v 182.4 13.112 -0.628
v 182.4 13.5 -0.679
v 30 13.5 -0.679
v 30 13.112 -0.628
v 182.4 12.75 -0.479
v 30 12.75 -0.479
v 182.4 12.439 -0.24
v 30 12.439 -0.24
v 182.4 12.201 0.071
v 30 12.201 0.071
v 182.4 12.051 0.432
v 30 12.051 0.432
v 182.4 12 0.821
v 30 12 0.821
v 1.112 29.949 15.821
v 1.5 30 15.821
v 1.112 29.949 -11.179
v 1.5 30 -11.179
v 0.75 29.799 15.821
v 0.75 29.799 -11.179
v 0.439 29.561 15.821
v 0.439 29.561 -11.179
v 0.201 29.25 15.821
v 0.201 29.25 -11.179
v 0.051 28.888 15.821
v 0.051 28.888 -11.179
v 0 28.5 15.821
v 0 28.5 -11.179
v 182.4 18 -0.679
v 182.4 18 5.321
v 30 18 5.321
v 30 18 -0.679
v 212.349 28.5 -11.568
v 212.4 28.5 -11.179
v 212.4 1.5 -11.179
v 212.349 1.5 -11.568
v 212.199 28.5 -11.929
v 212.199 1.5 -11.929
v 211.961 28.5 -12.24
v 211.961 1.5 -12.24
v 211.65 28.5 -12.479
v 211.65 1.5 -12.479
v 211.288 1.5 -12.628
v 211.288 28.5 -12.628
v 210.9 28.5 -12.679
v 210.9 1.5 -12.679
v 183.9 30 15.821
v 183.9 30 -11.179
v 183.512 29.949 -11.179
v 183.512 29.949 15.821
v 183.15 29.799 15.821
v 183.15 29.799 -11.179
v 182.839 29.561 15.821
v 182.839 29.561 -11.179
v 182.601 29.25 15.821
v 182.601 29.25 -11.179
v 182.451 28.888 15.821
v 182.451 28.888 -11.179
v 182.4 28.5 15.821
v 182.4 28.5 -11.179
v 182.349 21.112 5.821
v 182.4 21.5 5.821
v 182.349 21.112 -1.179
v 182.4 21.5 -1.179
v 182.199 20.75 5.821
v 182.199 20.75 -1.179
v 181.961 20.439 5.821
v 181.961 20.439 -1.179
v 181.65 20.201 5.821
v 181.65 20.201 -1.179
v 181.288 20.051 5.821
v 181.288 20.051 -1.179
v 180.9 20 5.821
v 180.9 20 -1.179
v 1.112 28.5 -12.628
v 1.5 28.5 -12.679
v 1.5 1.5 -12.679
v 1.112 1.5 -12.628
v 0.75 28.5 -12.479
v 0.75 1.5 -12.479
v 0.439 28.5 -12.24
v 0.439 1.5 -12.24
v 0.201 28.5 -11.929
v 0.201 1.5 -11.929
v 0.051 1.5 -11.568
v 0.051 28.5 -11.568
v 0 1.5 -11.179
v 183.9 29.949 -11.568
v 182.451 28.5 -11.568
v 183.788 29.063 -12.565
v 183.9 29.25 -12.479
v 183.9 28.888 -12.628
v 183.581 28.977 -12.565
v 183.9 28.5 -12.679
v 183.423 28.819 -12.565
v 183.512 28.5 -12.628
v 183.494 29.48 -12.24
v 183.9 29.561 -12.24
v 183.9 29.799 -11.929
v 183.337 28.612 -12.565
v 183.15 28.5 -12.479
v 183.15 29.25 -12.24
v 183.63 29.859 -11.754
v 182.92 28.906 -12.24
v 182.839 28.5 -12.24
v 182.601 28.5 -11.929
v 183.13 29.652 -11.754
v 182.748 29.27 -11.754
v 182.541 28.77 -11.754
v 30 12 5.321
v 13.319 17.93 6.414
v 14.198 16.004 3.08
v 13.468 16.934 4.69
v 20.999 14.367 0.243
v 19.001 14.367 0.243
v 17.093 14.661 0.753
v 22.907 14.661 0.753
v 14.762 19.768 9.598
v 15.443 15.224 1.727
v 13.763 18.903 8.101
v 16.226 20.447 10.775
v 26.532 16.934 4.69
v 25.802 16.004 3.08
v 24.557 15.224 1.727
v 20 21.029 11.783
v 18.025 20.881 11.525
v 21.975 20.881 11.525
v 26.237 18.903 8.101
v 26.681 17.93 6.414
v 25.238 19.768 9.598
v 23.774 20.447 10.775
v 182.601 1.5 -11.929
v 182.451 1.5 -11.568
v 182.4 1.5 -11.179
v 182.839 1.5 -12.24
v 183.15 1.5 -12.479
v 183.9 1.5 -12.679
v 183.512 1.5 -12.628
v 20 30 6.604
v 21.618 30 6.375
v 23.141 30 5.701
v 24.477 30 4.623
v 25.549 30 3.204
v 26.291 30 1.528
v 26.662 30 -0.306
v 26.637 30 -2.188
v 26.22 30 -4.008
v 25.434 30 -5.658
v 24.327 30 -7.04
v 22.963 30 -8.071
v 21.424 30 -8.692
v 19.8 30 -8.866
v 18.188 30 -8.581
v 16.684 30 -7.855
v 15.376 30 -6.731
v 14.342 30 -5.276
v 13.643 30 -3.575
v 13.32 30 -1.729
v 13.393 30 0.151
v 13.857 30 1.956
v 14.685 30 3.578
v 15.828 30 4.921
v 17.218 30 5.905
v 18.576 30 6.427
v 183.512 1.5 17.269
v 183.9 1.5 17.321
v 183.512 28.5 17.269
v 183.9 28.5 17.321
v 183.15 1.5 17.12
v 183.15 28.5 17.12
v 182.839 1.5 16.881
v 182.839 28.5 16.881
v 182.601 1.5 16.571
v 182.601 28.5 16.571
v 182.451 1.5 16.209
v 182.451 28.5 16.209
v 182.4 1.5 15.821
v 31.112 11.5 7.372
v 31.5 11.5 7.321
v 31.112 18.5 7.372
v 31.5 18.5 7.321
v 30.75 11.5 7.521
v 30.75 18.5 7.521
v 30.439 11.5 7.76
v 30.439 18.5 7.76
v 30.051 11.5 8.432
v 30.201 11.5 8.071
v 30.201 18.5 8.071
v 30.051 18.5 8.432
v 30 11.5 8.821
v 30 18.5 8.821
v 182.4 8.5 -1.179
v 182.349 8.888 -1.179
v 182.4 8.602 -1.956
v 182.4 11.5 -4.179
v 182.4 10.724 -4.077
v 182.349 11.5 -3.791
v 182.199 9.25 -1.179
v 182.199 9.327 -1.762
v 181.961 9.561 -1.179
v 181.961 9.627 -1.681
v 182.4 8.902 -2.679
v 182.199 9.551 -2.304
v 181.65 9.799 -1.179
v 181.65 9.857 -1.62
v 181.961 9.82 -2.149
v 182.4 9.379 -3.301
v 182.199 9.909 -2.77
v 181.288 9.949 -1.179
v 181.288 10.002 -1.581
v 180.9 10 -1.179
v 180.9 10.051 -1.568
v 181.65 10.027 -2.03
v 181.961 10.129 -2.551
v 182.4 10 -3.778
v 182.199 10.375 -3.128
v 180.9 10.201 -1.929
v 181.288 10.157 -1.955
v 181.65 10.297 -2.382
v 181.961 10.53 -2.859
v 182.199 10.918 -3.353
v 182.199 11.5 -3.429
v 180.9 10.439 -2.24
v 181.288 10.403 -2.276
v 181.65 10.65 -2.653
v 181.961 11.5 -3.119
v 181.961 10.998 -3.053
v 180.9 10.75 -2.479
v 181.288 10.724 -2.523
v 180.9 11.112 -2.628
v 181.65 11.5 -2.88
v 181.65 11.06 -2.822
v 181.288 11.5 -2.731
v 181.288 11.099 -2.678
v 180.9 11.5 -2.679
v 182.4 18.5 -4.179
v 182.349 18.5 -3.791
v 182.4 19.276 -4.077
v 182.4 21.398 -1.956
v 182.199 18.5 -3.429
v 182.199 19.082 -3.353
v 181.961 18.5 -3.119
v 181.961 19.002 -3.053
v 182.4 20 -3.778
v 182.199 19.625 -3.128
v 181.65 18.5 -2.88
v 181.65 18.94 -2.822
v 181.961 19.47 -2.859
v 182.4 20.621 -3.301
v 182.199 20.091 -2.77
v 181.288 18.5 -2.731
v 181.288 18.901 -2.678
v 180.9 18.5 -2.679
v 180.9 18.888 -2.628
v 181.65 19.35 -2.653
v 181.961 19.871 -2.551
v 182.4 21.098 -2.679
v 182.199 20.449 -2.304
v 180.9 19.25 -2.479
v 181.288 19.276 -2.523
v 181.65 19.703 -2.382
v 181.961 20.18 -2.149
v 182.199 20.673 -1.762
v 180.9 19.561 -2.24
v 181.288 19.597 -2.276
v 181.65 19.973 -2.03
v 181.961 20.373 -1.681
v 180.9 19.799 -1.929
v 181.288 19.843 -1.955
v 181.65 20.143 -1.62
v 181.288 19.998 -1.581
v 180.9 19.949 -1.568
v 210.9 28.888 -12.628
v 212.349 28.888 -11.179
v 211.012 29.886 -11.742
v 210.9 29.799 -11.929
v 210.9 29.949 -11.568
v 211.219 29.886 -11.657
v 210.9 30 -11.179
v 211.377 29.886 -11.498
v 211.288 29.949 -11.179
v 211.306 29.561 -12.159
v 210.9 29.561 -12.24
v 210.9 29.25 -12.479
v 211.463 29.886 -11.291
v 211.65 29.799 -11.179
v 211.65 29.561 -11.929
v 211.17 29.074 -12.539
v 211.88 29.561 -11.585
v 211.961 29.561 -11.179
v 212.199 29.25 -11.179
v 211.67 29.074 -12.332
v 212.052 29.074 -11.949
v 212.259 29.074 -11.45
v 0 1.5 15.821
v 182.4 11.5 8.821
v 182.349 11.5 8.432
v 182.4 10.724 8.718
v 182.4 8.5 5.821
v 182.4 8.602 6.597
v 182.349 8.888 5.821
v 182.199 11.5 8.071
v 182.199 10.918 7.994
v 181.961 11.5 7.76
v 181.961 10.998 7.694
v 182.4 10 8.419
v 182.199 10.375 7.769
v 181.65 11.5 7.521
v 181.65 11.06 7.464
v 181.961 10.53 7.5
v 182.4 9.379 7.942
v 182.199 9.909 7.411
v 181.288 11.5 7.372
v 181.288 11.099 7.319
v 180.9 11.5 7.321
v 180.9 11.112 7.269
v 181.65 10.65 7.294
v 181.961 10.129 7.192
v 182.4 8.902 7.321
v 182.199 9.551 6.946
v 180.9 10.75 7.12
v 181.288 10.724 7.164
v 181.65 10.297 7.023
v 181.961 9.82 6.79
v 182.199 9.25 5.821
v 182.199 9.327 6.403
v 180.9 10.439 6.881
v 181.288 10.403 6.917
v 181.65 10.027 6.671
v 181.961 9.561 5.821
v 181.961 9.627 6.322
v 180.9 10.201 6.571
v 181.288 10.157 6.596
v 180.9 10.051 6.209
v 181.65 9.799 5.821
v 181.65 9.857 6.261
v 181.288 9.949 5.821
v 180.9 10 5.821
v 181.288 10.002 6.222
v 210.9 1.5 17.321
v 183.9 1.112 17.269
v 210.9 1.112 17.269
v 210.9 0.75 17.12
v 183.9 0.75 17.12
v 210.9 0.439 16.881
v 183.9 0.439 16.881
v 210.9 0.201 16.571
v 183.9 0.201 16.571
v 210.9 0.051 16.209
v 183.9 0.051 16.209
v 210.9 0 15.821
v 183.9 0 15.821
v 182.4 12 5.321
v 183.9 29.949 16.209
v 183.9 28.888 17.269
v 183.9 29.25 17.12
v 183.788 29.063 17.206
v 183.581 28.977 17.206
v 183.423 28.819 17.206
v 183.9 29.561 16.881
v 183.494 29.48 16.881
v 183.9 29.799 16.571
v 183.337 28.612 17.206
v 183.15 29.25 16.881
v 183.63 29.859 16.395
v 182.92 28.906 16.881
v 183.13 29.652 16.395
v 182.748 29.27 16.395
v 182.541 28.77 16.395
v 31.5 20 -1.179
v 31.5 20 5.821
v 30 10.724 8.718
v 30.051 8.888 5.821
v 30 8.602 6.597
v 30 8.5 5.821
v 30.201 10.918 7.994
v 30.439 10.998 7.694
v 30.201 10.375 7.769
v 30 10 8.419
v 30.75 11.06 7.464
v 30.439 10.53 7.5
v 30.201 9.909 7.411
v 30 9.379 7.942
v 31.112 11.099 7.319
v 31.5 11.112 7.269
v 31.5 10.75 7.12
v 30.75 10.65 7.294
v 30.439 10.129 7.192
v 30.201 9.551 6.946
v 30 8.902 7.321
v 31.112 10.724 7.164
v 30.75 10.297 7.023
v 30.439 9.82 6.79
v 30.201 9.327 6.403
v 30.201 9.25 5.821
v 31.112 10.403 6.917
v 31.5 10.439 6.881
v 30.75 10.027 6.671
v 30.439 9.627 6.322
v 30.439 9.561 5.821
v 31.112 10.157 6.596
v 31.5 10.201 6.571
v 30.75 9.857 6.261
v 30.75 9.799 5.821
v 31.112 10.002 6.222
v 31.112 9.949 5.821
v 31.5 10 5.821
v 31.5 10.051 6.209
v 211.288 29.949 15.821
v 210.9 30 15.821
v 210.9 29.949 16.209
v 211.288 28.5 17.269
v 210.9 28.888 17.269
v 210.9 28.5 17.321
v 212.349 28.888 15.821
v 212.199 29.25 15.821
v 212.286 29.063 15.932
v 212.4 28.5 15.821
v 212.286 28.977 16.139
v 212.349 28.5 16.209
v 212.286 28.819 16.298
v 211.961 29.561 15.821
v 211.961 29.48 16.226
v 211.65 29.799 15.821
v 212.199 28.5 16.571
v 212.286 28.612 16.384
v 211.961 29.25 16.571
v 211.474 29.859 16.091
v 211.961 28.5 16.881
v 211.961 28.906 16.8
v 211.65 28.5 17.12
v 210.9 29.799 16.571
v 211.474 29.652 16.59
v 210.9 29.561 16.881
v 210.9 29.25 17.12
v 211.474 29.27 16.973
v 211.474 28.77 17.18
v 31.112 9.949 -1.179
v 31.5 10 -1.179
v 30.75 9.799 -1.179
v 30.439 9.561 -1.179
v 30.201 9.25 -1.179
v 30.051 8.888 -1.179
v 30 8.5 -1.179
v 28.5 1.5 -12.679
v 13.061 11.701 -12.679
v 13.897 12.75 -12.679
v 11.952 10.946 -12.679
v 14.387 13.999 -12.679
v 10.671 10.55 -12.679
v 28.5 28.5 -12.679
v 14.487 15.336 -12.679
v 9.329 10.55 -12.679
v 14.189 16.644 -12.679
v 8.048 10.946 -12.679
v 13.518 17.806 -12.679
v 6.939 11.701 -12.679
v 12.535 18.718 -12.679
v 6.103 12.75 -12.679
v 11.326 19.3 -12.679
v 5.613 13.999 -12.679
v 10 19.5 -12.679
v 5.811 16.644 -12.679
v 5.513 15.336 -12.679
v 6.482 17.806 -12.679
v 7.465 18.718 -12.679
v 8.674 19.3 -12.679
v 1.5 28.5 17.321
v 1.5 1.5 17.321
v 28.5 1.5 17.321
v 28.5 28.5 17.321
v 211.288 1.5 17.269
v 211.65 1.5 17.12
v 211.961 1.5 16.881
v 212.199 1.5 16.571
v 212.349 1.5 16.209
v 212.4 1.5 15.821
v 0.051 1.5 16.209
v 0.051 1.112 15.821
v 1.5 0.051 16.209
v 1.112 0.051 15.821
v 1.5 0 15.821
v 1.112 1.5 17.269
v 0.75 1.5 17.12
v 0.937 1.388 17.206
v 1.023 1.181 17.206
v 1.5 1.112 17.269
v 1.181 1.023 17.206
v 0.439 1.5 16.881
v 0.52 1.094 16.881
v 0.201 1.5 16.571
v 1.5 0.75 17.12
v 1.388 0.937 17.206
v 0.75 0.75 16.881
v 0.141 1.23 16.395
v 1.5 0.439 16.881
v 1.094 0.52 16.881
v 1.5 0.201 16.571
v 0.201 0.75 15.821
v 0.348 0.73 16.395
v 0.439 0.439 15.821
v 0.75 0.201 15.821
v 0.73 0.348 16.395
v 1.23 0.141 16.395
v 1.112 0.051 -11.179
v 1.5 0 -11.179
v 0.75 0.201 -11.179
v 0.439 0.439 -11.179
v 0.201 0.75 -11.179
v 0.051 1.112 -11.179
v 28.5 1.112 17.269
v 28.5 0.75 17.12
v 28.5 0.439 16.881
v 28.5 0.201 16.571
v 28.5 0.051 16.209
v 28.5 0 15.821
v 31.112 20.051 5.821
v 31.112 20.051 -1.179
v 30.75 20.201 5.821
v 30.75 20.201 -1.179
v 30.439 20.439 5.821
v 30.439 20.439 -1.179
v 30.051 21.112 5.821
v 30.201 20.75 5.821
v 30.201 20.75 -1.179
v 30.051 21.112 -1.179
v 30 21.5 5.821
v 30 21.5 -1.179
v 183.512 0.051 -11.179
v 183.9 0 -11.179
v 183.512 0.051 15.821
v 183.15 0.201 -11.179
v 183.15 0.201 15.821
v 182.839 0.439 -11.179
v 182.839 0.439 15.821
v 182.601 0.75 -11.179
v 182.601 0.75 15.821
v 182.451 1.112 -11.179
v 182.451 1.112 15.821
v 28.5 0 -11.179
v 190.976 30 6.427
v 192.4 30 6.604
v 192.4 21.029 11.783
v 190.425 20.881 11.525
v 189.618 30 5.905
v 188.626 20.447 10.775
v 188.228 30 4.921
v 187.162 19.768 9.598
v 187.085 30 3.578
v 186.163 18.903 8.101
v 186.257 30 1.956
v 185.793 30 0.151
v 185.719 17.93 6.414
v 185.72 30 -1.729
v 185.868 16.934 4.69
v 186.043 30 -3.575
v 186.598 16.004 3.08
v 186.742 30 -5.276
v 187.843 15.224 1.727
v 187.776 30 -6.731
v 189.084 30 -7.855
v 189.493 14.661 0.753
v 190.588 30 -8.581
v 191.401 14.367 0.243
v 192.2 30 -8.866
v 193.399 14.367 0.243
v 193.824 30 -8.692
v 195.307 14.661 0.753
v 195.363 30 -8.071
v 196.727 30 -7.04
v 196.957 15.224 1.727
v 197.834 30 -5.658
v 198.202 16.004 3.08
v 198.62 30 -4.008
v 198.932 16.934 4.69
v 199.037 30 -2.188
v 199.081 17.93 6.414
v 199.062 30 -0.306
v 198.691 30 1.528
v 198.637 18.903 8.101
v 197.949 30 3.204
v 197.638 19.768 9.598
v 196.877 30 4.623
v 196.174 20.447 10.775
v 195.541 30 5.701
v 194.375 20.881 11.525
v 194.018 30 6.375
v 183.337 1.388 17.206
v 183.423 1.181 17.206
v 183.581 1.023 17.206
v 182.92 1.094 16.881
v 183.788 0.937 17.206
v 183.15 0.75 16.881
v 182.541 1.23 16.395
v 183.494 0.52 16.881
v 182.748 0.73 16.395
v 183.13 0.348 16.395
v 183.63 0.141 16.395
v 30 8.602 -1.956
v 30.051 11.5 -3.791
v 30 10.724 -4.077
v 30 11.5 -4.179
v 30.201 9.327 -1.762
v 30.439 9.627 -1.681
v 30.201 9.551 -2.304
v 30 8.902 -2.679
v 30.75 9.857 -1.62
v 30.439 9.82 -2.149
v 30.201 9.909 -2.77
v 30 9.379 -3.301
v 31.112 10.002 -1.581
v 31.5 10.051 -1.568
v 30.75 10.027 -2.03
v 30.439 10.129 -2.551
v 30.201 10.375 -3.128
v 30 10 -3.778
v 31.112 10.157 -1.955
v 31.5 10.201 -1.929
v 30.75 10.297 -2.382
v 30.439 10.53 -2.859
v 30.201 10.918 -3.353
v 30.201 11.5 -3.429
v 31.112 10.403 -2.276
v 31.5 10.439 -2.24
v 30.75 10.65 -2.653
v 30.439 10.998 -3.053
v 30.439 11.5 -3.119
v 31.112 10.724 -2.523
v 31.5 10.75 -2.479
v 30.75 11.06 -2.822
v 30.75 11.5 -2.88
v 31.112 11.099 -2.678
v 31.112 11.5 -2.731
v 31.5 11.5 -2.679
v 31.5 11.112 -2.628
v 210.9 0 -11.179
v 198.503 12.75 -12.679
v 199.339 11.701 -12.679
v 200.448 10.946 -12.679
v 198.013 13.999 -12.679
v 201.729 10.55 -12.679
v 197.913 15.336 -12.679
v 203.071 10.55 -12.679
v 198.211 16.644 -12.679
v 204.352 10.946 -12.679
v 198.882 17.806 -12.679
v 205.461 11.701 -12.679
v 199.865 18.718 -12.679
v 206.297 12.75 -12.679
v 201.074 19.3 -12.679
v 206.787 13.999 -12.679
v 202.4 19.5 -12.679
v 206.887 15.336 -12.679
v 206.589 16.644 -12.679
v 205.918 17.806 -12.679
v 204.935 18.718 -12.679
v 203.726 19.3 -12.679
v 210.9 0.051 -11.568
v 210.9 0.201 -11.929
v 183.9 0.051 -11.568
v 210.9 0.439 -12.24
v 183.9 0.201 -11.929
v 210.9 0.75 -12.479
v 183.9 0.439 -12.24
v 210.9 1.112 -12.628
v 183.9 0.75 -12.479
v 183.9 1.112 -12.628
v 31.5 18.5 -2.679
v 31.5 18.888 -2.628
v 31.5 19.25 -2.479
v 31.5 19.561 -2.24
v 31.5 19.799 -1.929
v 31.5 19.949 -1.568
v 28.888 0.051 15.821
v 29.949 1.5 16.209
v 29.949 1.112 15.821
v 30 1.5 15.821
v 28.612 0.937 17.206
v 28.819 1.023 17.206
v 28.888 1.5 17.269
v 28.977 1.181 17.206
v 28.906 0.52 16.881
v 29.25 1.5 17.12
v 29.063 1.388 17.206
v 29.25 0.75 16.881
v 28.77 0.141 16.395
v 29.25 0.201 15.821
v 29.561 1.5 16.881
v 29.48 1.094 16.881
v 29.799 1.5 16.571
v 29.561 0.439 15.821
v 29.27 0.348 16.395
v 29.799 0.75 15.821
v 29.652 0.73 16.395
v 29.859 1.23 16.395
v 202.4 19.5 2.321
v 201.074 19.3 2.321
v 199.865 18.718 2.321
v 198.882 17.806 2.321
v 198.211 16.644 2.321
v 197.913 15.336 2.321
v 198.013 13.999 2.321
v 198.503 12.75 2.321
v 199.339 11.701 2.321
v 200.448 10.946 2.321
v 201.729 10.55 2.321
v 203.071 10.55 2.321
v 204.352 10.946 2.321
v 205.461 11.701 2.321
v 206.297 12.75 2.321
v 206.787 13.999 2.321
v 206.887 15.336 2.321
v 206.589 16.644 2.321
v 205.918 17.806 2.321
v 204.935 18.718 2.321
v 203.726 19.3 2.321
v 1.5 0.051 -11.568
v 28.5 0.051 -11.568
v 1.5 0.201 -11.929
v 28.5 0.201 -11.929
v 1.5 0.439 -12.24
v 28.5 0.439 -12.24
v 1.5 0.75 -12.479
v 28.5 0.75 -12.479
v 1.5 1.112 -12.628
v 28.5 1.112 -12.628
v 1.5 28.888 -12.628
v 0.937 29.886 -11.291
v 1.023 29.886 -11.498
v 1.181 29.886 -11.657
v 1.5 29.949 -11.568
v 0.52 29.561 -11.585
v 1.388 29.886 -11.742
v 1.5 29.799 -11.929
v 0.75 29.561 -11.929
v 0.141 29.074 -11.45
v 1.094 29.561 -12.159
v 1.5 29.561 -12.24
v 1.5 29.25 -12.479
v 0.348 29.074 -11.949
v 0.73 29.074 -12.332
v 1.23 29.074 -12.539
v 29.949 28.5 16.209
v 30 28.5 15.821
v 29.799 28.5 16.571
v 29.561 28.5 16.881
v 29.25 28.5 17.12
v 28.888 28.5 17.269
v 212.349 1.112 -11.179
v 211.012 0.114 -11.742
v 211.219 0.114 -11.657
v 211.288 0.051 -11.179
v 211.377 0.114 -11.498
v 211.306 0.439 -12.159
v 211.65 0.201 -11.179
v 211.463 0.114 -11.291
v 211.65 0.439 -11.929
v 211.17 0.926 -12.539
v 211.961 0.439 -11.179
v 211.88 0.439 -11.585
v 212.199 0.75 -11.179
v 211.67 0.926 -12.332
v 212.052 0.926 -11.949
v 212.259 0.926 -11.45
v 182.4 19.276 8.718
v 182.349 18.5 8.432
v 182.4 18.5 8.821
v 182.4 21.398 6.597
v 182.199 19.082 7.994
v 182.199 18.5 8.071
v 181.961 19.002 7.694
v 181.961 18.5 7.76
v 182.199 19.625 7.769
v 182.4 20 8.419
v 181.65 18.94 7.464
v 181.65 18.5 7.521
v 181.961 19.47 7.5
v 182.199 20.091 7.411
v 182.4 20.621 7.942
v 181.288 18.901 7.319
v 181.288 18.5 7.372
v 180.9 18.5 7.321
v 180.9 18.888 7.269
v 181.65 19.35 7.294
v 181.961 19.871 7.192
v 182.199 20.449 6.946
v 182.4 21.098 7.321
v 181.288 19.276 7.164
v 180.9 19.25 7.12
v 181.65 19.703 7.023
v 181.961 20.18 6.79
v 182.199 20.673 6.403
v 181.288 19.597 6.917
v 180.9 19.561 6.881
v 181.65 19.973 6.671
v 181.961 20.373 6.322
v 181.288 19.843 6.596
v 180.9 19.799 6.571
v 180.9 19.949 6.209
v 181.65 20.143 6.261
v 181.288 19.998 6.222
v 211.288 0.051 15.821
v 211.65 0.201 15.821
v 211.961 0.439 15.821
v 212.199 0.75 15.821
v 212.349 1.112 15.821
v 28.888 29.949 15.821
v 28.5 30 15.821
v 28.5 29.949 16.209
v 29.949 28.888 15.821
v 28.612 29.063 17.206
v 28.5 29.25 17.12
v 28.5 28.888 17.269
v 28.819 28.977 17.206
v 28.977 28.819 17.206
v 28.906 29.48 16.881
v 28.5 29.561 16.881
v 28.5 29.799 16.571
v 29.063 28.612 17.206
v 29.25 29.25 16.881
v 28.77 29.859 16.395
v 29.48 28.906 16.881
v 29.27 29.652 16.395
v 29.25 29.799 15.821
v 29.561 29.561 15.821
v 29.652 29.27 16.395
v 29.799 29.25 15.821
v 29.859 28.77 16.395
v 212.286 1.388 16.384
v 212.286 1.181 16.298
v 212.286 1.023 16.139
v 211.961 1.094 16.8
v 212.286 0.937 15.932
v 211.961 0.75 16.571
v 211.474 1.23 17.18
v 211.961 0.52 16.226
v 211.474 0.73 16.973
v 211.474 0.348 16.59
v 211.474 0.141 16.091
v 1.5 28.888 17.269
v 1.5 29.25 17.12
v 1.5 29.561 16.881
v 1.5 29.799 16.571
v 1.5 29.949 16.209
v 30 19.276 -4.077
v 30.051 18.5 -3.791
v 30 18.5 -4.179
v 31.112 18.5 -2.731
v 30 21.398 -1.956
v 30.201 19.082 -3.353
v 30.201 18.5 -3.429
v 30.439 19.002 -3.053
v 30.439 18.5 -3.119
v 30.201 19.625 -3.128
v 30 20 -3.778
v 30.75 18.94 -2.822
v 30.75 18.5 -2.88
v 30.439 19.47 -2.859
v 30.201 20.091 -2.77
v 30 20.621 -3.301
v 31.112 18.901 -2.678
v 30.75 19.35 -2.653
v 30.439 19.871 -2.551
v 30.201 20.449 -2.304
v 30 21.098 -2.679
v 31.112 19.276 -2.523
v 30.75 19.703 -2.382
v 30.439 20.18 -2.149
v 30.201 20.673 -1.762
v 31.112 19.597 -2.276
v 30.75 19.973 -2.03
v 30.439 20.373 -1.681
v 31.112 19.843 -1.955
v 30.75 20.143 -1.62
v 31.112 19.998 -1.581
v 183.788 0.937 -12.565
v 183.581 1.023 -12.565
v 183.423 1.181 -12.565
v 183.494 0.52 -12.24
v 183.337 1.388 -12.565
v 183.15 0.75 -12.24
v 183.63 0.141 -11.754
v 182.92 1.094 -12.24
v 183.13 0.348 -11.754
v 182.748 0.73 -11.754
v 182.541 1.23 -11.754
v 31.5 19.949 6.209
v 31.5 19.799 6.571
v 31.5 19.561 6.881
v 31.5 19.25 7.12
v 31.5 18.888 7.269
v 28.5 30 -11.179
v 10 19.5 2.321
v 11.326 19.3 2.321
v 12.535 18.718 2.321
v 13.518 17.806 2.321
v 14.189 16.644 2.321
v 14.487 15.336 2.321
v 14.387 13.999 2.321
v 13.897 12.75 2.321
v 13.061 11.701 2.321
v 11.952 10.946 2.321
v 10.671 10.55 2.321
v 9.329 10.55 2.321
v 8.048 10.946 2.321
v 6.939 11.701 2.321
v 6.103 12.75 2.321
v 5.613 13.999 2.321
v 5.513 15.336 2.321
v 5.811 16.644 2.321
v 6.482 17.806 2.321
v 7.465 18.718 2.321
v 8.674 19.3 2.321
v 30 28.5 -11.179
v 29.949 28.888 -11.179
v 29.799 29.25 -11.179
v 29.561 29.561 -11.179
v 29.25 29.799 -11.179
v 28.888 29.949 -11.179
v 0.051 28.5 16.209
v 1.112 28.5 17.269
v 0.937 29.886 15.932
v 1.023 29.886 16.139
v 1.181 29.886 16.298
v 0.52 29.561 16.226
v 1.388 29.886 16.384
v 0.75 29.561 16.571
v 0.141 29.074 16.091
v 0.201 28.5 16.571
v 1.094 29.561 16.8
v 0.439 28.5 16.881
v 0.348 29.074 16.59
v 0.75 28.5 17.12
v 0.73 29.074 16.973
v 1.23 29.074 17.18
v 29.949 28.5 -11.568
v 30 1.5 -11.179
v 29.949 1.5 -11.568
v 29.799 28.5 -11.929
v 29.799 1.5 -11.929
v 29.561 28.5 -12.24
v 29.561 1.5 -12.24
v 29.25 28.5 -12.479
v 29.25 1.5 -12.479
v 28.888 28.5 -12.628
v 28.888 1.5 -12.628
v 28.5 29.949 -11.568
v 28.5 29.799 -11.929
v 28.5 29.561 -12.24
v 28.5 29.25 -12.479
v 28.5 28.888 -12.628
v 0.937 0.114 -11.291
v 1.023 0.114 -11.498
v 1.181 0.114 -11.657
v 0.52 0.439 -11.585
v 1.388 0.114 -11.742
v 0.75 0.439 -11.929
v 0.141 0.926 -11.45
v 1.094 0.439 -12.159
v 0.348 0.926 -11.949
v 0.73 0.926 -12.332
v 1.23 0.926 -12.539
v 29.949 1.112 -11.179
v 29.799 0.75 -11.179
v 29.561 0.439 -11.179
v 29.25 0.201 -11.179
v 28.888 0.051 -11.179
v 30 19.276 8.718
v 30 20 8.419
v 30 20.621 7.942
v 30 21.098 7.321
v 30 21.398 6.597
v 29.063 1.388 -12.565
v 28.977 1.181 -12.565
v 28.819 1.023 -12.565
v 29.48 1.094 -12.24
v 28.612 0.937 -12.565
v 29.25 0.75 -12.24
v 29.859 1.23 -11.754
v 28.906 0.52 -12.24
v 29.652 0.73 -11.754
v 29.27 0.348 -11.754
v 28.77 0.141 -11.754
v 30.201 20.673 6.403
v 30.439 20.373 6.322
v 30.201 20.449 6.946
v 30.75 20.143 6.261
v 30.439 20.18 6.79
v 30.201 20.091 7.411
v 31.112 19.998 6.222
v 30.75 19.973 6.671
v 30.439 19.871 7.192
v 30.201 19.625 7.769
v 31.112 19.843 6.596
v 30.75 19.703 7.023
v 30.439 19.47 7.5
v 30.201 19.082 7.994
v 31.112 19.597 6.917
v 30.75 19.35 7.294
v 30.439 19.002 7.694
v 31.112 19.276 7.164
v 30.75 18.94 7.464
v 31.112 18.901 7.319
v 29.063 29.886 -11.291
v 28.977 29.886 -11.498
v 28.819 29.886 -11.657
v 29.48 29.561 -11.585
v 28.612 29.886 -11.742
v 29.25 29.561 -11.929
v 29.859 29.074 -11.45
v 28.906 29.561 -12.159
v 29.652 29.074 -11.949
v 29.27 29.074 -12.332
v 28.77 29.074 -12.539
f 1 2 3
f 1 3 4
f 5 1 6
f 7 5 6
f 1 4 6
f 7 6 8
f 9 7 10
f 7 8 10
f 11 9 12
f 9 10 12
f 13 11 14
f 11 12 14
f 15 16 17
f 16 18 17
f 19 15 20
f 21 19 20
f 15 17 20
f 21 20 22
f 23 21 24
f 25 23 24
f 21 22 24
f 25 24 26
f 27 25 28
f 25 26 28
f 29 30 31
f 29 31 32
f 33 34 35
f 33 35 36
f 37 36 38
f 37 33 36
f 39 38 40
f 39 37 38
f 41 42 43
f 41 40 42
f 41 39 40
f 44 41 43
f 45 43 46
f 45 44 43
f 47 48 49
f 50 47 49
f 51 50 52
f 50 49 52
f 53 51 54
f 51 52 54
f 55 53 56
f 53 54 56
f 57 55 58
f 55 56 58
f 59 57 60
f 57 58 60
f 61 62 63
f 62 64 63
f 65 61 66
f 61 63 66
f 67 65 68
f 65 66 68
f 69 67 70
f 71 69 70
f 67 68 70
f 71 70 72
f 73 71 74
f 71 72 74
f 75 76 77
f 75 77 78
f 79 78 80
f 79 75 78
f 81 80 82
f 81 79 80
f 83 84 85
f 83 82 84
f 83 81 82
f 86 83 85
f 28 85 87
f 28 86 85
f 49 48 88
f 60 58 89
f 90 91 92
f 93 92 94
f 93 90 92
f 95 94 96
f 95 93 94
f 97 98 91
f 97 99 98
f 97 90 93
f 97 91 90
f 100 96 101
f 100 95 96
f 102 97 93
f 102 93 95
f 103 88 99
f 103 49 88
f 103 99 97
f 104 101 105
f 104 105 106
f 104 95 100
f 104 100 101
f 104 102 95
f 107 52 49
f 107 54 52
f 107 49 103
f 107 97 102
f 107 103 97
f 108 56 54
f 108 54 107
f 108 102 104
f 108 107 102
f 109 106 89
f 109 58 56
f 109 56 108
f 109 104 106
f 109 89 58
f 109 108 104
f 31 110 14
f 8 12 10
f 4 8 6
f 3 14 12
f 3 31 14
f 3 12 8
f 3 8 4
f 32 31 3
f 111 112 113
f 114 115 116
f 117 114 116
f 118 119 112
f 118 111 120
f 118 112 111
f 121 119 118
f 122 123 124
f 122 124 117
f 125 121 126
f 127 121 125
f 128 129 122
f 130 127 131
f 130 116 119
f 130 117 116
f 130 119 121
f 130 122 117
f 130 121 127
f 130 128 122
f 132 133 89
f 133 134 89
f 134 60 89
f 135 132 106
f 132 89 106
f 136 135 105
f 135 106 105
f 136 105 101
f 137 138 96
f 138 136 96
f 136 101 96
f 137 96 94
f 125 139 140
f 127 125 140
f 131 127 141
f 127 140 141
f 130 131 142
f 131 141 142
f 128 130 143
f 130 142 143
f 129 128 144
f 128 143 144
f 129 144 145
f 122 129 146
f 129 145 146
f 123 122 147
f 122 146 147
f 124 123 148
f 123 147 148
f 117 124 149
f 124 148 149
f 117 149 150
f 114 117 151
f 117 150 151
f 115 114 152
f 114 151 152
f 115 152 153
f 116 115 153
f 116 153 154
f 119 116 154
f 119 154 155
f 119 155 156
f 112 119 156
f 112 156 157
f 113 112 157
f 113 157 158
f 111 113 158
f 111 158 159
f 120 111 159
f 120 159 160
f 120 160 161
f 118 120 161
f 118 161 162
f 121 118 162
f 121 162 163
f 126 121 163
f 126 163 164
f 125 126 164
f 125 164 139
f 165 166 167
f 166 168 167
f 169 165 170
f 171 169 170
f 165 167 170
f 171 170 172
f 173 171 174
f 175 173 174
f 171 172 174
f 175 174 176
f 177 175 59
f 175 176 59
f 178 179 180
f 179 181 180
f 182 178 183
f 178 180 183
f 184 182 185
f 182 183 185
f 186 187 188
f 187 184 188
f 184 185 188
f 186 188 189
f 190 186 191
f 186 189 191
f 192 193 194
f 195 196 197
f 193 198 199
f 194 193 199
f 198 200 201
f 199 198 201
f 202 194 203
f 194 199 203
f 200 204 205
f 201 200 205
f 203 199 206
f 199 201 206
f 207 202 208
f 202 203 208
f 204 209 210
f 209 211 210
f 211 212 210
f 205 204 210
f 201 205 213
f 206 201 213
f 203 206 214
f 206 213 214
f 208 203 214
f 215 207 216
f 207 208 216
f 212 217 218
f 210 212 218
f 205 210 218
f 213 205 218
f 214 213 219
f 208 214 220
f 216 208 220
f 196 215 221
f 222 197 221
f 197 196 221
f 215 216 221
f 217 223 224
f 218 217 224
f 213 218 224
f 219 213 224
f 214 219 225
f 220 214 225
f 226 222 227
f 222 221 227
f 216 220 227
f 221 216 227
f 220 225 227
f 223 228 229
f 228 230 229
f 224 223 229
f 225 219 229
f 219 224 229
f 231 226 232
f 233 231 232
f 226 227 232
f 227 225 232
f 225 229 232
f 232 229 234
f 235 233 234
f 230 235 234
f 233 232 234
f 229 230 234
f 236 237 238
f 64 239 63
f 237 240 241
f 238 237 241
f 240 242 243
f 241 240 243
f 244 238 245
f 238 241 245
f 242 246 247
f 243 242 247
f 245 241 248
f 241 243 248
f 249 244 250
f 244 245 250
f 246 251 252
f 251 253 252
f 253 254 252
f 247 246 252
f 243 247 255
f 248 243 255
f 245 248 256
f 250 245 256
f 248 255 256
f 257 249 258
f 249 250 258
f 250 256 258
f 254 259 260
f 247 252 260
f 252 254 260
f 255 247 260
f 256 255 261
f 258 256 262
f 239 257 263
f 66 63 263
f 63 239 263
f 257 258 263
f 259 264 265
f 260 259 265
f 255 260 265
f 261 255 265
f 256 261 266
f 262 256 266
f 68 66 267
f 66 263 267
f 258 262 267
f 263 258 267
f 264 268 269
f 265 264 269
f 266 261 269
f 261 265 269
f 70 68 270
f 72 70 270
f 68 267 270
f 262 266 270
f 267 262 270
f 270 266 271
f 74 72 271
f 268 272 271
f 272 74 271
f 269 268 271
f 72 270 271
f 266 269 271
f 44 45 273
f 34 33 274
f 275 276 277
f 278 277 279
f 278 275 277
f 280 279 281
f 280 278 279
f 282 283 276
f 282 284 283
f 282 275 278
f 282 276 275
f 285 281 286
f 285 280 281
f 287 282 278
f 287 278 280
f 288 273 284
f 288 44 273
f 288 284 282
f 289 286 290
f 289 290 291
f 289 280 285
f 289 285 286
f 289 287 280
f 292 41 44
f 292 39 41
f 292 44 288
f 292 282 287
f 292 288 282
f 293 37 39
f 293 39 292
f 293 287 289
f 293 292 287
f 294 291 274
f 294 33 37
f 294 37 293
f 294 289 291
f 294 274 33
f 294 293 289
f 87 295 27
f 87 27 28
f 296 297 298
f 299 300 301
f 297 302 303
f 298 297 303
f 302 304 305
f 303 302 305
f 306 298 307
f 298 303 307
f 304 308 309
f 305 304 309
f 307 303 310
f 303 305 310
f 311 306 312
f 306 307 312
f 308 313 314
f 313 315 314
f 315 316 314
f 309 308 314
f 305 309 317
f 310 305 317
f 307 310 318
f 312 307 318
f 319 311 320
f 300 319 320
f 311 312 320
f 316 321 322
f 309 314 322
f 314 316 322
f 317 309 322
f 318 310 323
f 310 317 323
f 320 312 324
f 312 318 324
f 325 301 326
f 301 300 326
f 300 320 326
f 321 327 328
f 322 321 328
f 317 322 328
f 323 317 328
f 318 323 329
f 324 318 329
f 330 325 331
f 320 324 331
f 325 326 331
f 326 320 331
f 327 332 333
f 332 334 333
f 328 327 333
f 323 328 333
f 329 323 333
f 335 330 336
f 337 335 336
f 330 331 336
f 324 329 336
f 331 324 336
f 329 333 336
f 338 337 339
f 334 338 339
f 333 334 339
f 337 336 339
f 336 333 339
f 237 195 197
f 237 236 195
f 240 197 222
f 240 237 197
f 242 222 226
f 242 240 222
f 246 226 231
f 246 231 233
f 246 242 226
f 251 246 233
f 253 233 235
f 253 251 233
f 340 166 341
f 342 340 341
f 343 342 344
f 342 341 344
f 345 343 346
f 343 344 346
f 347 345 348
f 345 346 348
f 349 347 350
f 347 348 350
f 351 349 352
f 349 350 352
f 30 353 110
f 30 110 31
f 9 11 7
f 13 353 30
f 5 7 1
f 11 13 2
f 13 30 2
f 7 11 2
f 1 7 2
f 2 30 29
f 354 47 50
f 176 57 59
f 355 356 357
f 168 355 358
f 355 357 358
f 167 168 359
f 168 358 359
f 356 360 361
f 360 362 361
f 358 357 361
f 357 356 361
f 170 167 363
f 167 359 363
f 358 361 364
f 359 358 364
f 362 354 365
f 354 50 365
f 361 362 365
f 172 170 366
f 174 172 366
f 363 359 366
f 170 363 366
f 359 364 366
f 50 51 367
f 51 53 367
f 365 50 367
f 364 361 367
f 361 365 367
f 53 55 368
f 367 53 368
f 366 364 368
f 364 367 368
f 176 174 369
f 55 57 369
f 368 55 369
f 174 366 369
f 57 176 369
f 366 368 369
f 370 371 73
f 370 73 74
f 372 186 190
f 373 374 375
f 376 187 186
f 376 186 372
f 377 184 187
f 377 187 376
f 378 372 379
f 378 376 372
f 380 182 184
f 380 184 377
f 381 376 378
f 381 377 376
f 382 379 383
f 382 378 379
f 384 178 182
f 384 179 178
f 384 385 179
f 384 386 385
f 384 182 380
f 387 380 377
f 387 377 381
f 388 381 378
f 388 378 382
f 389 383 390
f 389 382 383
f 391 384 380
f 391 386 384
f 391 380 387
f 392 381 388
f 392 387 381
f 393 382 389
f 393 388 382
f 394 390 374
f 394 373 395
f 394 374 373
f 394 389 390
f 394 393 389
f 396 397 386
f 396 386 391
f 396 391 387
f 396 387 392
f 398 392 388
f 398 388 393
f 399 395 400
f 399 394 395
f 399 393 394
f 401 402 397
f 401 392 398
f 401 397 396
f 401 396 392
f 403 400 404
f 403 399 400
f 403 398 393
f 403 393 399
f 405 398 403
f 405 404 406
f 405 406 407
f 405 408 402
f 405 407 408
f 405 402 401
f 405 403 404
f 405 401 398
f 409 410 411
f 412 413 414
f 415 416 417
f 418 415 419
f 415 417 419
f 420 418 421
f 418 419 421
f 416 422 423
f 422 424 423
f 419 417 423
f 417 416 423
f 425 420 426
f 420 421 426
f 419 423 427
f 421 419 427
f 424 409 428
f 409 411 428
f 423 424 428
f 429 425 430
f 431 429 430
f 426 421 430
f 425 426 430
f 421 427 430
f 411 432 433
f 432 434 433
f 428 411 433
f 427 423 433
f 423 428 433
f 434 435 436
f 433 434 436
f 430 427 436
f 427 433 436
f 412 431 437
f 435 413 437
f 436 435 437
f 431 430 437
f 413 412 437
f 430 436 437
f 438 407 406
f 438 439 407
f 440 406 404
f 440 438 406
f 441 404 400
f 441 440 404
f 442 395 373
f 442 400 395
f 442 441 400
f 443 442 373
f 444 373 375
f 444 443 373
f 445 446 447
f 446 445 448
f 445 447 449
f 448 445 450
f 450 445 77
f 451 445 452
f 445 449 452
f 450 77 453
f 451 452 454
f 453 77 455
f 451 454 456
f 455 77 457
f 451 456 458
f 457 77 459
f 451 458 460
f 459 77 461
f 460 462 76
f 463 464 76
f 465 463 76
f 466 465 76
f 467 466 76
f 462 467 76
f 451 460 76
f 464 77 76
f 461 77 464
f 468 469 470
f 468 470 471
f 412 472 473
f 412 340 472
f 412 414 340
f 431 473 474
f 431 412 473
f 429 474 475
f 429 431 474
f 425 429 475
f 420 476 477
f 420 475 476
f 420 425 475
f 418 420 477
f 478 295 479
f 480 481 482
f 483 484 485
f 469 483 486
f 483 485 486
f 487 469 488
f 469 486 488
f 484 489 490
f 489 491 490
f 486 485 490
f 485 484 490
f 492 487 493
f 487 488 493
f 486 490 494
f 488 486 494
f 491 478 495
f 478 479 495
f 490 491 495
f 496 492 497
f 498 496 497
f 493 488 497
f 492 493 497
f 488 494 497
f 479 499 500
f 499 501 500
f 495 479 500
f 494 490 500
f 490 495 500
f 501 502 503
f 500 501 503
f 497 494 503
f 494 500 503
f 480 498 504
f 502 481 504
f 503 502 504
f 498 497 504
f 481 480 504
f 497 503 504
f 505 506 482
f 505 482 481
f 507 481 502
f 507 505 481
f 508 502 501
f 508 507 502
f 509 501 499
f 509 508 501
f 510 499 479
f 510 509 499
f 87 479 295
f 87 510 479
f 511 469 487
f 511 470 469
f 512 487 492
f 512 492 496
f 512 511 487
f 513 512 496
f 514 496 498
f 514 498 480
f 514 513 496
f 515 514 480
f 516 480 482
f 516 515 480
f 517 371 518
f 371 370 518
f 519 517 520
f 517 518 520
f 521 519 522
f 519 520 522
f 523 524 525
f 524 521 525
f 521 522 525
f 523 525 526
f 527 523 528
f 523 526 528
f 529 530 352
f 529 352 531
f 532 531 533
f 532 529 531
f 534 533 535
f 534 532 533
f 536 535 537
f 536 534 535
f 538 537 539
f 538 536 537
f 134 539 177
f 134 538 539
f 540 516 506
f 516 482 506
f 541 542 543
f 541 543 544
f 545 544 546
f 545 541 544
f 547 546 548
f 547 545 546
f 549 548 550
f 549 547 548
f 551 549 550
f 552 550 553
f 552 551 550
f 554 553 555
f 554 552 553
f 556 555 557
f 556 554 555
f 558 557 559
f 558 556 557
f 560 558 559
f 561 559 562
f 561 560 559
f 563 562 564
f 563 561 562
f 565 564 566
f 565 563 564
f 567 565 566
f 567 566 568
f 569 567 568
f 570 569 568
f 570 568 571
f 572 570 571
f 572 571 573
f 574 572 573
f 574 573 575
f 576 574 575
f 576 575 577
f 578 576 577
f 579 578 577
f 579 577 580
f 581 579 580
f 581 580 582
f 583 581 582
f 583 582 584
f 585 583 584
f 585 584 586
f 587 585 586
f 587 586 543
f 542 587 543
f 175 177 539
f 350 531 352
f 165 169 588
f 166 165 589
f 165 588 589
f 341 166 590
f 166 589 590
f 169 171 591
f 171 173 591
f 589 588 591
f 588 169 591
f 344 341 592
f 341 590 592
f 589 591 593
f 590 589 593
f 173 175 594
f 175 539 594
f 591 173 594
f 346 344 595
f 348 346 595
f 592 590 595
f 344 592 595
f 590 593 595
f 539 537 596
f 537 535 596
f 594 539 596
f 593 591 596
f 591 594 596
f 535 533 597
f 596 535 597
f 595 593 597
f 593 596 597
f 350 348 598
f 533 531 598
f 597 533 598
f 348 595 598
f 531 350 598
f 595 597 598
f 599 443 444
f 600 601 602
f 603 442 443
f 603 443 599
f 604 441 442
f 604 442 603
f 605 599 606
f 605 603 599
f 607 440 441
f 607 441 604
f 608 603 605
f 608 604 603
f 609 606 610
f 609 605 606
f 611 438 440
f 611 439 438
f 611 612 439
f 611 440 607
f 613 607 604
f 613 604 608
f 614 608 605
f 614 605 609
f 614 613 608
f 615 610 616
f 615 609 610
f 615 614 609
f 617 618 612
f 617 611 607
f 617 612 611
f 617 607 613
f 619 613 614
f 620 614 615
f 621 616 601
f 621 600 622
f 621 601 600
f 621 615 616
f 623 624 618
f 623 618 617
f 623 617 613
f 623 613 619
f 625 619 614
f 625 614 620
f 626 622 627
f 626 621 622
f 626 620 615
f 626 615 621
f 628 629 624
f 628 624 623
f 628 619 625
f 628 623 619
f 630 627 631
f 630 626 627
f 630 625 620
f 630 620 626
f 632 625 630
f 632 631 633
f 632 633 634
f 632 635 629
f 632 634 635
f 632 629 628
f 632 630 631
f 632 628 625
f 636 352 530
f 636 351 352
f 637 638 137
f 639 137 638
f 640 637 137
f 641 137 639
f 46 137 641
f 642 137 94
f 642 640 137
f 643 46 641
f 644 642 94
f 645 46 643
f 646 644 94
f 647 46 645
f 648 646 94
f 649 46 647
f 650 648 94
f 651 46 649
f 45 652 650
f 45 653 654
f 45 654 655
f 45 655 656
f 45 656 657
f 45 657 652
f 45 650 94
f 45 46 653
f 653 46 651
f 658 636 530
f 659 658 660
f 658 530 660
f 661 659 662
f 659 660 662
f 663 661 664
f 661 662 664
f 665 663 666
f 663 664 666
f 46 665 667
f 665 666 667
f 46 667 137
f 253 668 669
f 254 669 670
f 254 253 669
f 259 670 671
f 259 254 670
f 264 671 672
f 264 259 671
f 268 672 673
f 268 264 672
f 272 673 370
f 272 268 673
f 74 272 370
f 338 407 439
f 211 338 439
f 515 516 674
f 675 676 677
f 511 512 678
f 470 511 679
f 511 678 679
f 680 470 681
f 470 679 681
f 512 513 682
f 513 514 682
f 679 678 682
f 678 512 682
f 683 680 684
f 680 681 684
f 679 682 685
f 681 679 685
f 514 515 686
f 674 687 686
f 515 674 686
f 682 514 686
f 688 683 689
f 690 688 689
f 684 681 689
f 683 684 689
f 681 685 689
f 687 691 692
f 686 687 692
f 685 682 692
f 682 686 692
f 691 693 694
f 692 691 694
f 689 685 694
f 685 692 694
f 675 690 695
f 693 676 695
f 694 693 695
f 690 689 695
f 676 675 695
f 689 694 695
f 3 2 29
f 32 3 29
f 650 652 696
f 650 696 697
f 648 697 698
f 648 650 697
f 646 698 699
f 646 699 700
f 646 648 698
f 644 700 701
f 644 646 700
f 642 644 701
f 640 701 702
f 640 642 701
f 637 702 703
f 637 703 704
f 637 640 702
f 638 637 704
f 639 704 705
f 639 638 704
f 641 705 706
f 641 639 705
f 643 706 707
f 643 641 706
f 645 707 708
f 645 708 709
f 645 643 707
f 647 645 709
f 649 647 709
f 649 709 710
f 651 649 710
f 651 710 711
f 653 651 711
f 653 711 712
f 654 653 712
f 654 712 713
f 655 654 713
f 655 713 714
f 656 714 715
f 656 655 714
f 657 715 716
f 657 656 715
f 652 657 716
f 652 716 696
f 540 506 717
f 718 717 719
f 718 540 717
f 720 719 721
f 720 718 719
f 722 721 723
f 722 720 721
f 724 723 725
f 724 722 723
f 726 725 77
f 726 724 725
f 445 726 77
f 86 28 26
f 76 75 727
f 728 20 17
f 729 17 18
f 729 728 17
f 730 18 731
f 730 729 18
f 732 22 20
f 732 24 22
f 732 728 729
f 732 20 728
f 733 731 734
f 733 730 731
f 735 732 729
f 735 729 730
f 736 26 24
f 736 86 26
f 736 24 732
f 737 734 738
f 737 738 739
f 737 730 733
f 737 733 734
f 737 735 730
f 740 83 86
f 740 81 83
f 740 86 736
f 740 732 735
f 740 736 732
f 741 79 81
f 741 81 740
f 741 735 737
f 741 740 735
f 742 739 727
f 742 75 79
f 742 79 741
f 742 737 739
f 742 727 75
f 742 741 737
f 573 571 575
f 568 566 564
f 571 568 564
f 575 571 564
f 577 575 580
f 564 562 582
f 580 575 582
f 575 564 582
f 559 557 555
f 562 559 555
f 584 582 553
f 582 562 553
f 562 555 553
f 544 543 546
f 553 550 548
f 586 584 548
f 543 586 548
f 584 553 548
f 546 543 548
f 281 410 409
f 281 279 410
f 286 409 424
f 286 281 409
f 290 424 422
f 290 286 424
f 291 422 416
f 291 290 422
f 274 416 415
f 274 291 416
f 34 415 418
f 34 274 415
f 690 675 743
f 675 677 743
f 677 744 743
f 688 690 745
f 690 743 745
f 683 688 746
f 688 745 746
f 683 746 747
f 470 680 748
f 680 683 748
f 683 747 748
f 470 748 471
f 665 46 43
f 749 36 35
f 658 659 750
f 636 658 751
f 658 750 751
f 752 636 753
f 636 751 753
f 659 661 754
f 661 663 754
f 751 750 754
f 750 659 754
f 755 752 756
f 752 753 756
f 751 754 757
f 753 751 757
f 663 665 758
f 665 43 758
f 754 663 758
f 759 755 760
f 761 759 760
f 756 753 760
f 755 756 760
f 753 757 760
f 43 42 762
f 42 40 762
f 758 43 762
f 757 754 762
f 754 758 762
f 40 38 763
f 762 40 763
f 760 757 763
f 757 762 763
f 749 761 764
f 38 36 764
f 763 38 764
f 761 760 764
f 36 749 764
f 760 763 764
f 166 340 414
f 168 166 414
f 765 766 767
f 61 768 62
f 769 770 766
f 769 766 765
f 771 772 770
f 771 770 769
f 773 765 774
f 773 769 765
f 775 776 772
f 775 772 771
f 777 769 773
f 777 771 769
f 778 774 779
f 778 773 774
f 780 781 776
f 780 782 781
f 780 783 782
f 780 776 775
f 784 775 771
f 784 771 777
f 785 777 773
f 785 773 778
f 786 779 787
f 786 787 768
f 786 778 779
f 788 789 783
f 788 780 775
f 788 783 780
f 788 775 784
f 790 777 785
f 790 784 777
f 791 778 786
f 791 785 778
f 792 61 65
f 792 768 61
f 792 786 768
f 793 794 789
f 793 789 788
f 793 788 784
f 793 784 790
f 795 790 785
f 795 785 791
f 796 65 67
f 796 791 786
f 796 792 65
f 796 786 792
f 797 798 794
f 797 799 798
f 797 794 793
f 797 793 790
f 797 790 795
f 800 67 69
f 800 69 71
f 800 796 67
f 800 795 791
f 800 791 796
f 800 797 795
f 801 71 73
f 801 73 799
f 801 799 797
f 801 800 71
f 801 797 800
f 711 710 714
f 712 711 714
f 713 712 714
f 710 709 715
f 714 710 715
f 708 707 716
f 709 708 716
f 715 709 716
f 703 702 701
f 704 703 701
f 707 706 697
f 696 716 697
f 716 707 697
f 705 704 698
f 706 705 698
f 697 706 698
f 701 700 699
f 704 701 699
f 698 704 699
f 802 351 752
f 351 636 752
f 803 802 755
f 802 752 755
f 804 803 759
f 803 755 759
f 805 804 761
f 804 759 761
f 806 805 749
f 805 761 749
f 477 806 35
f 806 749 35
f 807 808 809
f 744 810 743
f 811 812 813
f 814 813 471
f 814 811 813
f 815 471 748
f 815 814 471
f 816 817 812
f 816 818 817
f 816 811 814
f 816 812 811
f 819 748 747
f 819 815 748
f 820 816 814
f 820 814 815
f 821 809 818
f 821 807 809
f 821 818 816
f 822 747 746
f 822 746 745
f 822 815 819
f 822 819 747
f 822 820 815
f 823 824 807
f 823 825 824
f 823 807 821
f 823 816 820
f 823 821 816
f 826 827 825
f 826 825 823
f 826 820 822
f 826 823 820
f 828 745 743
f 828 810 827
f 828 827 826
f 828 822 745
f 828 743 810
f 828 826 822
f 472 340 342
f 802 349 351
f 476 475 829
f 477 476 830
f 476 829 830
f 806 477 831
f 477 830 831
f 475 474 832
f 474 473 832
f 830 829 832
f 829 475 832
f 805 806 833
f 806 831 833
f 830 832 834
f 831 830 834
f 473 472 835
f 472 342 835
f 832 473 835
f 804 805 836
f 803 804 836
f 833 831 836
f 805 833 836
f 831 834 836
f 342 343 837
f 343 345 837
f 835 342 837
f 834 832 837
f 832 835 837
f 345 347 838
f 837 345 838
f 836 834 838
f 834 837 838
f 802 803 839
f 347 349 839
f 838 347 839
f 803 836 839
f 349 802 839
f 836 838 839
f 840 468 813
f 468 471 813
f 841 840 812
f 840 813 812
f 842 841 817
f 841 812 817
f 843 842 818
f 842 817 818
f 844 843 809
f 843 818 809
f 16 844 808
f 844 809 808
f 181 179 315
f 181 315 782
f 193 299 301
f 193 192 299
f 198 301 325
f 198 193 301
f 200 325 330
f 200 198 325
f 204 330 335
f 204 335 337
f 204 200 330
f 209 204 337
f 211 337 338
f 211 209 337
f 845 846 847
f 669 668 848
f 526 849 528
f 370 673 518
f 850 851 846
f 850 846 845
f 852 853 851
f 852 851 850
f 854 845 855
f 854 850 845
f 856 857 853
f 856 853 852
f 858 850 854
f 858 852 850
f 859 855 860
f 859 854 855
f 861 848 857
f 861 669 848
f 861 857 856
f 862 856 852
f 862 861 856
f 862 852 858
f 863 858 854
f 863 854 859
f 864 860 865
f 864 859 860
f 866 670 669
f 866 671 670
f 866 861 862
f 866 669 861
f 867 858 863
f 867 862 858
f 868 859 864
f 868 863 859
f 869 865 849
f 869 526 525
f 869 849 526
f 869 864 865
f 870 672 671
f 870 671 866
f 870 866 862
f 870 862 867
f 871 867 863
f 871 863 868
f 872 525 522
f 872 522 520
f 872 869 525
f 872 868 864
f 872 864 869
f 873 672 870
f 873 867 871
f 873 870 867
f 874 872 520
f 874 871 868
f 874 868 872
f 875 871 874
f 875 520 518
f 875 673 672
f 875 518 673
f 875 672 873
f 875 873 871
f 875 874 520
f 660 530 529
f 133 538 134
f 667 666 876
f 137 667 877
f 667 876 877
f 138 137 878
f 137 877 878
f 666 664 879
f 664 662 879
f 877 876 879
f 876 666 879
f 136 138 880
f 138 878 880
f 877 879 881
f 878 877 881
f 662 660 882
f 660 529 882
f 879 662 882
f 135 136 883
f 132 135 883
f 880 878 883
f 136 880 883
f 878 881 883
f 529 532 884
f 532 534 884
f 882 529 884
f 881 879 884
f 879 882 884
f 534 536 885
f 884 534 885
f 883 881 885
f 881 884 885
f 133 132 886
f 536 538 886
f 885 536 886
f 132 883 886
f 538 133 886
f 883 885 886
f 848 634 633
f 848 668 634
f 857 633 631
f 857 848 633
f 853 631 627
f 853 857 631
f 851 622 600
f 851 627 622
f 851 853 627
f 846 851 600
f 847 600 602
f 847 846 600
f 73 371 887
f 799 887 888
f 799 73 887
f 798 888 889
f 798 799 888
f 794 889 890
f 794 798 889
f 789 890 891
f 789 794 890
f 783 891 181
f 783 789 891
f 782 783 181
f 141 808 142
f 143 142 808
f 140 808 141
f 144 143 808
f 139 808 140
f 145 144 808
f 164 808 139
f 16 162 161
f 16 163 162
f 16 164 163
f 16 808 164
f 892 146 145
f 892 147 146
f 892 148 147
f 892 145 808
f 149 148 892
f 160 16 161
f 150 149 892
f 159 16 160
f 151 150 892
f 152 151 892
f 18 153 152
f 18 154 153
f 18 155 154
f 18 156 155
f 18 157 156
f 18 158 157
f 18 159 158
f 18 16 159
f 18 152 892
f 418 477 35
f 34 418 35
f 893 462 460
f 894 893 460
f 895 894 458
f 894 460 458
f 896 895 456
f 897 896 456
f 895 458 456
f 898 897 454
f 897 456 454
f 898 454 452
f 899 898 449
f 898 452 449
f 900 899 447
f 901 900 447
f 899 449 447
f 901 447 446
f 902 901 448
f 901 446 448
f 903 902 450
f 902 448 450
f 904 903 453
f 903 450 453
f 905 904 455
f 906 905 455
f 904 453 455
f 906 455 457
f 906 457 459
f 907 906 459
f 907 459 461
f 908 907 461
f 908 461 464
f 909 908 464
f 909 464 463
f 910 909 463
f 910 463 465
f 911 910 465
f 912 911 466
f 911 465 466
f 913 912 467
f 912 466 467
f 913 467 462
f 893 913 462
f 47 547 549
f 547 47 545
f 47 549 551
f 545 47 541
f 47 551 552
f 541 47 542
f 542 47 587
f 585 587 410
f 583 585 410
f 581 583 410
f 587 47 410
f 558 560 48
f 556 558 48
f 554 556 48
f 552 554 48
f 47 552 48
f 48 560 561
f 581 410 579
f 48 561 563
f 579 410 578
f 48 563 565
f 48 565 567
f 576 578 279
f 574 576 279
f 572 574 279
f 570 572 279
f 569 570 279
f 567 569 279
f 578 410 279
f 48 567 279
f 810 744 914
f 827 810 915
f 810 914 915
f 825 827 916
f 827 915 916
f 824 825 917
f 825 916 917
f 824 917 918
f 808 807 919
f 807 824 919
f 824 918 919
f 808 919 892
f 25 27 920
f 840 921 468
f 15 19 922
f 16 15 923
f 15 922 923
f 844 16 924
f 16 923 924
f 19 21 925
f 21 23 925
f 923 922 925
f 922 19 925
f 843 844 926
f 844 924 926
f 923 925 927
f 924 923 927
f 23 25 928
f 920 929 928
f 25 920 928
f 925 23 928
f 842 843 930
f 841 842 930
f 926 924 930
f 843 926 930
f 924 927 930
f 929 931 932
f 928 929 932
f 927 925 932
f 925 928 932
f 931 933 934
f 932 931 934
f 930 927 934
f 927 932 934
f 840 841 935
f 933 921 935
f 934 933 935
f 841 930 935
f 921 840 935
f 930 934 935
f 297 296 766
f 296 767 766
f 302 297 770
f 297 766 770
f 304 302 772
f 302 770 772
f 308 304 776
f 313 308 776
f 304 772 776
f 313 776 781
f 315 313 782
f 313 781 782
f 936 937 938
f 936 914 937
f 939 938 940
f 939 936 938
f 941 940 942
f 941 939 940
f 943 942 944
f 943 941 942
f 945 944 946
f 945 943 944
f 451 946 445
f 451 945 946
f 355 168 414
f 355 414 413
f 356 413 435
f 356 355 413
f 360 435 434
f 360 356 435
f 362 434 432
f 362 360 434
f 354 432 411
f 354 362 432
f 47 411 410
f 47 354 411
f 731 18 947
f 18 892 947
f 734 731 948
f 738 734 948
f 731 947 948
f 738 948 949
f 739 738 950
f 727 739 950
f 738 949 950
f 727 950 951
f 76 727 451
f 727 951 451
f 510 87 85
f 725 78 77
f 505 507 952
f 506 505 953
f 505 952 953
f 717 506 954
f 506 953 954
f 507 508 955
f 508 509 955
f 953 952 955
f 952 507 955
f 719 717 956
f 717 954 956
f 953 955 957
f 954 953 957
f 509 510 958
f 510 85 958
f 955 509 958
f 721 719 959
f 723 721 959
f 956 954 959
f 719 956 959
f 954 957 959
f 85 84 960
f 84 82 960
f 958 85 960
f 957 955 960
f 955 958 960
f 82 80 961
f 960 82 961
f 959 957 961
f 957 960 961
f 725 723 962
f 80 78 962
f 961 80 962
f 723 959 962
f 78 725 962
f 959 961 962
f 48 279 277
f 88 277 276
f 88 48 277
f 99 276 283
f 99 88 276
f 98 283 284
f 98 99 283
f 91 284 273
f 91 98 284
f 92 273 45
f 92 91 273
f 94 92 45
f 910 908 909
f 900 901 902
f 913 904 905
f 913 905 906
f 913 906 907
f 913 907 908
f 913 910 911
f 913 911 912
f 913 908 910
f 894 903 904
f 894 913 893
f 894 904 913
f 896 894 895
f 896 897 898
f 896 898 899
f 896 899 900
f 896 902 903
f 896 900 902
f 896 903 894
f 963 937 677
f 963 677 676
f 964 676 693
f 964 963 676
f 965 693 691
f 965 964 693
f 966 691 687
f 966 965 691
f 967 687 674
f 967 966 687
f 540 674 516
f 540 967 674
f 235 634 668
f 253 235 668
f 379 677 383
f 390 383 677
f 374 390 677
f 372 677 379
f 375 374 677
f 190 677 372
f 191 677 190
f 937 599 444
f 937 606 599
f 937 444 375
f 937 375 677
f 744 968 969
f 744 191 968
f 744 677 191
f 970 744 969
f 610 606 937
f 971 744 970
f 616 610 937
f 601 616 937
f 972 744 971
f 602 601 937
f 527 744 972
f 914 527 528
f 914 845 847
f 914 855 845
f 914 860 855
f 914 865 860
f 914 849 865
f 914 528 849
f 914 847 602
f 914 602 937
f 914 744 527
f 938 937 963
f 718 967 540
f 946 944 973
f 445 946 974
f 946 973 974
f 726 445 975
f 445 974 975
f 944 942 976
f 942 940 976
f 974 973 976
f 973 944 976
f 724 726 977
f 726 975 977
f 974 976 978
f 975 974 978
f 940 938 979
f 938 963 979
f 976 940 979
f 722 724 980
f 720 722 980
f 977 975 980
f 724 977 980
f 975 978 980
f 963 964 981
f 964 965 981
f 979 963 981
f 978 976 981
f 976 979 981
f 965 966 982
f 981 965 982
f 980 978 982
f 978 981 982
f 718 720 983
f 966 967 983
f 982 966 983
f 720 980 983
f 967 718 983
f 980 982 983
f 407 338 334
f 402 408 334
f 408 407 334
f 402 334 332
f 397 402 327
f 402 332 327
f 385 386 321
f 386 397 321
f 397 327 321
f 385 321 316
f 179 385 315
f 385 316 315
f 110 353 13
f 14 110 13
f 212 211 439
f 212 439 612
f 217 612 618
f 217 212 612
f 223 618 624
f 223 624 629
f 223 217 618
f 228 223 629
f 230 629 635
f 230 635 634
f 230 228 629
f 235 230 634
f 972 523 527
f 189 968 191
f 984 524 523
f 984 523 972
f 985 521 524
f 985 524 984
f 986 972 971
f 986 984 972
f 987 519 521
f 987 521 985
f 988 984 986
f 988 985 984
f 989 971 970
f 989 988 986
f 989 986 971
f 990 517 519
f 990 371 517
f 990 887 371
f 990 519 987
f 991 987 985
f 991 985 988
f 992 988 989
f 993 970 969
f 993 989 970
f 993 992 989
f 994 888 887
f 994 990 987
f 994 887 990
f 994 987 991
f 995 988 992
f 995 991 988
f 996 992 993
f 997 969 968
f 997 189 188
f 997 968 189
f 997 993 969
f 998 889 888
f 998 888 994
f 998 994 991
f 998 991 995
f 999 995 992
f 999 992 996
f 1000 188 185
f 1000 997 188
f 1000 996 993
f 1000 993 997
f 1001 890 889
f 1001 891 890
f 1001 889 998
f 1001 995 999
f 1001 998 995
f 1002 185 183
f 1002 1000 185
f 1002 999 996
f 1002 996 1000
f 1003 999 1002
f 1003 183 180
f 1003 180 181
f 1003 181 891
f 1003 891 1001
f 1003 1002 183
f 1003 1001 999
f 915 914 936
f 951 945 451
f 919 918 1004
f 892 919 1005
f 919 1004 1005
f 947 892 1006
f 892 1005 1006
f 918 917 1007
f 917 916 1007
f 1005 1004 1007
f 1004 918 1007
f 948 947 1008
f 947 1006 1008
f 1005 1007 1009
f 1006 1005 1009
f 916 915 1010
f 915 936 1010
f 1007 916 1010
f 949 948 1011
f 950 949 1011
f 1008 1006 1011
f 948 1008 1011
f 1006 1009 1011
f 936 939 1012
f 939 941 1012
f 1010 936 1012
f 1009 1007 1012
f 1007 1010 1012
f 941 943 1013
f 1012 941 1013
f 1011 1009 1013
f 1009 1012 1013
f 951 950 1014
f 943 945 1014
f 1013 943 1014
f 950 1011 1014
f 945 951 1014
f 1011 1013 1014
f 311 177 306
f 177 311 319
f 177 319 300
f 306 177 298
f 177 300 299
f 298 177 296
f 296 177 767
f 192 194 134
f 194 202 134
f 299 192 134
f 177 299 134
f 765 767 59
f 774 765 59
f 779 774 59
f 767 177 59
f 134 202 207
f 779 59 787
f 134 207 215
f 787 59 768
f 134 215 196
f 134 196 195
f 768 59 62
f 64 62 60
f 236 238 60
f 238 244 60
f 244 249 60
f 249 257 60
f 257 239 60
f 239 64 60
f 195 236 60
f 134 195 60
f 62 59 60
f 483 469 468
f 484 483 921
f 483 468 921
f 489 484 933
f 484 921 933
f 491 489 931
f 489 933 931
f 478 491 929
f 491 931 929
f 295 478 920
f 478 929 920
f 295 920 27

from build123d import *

# Parameters (mm, degrees)
SKETCH1_W           = 30
SKETCH1_H           = 30
BOSS_EXTRUDE1_DEPTH = 30
SKETCH2_W           = 10
SKETCH2_H           = 10
BOSS_EXTRUDE2_DEPTH = 152.4
SKETCH3_W           = 6
SKETCH3_H           = 6
CUT_EXTRUDE1_DEPTH  = 152.4
SKETCH6_R           = 4.5
CUT_EXTRUDE2_DEPTH  = 15
SKETCH7_R           = 6.7
CUT_EXTRUDE3_DEPTH  = 20
FILLET1_R           = 1.5


with BuildPart() as part:
    # Sketch1 → Boss-Extrude1 (new body)
    with BuildSketch(Plane(origin=(0, 0, 0), x_dir=(0, 0, -1), z_dir=(1, 0, 0))):
        with Locations((-2.320508076, 15)):
            Rectangle(SKETCH1_W, SKETCH1_H)
    boss_extrude1 = extrude(amount=BOSS_EXTRUDE1_DEPTH)

    # Sketch2 → Boss-Extrude2 (add)
    with BuildSketch(Plane(origin=(30, 0, 0), x_dir=(0, 0, -1), z_dir=(1, 0, 0))):
        with Locations((-2.320508076, 15)):
            Rectangle(SKETCH2_W, SKETCH2_H)
    extrude(amount=BOSS_EXTRUDE2_DEPTH)

    # Sketch3 → Cut-Extrude1 (cut)
    with BuildSketch(Plane(origin=(182.4, 0, 0), x_dir=(0, 0, -1), z_dir=(1, 0, 0))):
        with Locations((-2.320508076, 15)):
            Rectangle(SKETCH3_W, SKETCH3_H)
    extrude(amount=-CUT_EXTRUDE1_DEPTH, mode=Mode.SUBTRACT)

    # Sketch6 → Cut-Extrude2 (cut)
    with BuildSketch(Plane(origin=(0, 0, -12.679491924), x_dir=(-1, 0, 0), z_dir=(0, 0, -1))):
        with Locations(Location((-10, 15, 0), (0, 0, 90))):
            Circle(SKETCH6_R)
    cut_extrude2 = extrude(amount=-CUT_EXTRUDE2_DEPTH, mode=Mode.SUBTRACT)

    # Sketch7 → Cut-Extrude3 (cut)
    with BuildSketch(Plane(origin=(0, 27.990381057, -16.160254038), x_dir=(-1, 0, 0), z_dir=(0, 0.8660254037844349, -0.5000000000000066))):
        with Locations(Location((-20, 14.019237886, 0), (0, 0, 90))):
            Circle(SKETCH7_R)
    cut_extrude3 = extrude(amount=-CUT_EXTRUDE3_DEPTH, mode=Mode.SUBTRACT)

    # Mirror1: Boss-Extrude1, Cut-Extrude2, Cut-Extrude3 across plane
    add(boss_extrude1.mirror(Plane(origin=(106.2, 0, 0), x_dir=(0, 0, 1), z_dir=(1, 0, 0))))
    add(cut_extrude2.mirror(Plane(origin=(106.2, 0, 0), x_dir=(0, 0, 1), z_dir=(1, 0, 0))), mode=Mode.SUBTRACT)
    add(cut_extrude3.mirror(Plane(origin=(106.2, 0, 0), x_dir=(0, 0, 1), z_dir=(1, 0, 0))), mode=Mode.SUBTRACT)

    # Fillet1
    fillet1_edges = [part.edges().sort_by_distance(p)[0] for p in [
        (30, 0, 2.320508076),
        (30, 15, 7.320508076),
        (106.2, 20, 7.320508076),
        (30, 10, 2.320508076),
        (106.2, 10, 7.320508076),
        (30, 15, -2.679491924),
        (106.2, 10, -2.679491924),
        (30, 20, 2.320508076),
        (106.2, 20, -2.679491924),
        (30, 15, -12.679491924),
        (182.4, 15, 7.320508076),
        (182.4, 10, 2.320508076),
        (182.4, 15, -2.679491924),
        (182.4, 20, 2.320508076),
        (106.2, 12, -0.679491924),
        (30, 30, 2.320508076),
        (0, 15, -12.679491924),
        (0, 0, 2.320508076),
        (0, 15, 17.320508076),
        (182.4, 30, 2.320508076),
        (197.4, 30, 17.320508076),
        (212.4, 15, -12.679491924),
        (197.4, 30, -12.679491924),
        (182.4, 0, 2.320508076),
        (197.4, 0, -12.679491924),
        (182.4, 15, 17.320508076),
        (197.4, 0, 17.320508076),
        (182.4, 15, -12.679491924),
        (212.4, 30, 2.320508076),
        (212.4, 15, 17.320508076),
        (212.4, 0, 2.320508076),
        (0, 30, 2.320508076),
        (15, 30, -12.679491924),
        (15, 0, -12.679491924),
        (15, 0, 17.320508076),
        (15, 30, 17.320508076),
        (30, 15, 17.320508076),
    ]]
    fillet(fillet1_edges, radius=FILLET1_R)


solid = part.part
